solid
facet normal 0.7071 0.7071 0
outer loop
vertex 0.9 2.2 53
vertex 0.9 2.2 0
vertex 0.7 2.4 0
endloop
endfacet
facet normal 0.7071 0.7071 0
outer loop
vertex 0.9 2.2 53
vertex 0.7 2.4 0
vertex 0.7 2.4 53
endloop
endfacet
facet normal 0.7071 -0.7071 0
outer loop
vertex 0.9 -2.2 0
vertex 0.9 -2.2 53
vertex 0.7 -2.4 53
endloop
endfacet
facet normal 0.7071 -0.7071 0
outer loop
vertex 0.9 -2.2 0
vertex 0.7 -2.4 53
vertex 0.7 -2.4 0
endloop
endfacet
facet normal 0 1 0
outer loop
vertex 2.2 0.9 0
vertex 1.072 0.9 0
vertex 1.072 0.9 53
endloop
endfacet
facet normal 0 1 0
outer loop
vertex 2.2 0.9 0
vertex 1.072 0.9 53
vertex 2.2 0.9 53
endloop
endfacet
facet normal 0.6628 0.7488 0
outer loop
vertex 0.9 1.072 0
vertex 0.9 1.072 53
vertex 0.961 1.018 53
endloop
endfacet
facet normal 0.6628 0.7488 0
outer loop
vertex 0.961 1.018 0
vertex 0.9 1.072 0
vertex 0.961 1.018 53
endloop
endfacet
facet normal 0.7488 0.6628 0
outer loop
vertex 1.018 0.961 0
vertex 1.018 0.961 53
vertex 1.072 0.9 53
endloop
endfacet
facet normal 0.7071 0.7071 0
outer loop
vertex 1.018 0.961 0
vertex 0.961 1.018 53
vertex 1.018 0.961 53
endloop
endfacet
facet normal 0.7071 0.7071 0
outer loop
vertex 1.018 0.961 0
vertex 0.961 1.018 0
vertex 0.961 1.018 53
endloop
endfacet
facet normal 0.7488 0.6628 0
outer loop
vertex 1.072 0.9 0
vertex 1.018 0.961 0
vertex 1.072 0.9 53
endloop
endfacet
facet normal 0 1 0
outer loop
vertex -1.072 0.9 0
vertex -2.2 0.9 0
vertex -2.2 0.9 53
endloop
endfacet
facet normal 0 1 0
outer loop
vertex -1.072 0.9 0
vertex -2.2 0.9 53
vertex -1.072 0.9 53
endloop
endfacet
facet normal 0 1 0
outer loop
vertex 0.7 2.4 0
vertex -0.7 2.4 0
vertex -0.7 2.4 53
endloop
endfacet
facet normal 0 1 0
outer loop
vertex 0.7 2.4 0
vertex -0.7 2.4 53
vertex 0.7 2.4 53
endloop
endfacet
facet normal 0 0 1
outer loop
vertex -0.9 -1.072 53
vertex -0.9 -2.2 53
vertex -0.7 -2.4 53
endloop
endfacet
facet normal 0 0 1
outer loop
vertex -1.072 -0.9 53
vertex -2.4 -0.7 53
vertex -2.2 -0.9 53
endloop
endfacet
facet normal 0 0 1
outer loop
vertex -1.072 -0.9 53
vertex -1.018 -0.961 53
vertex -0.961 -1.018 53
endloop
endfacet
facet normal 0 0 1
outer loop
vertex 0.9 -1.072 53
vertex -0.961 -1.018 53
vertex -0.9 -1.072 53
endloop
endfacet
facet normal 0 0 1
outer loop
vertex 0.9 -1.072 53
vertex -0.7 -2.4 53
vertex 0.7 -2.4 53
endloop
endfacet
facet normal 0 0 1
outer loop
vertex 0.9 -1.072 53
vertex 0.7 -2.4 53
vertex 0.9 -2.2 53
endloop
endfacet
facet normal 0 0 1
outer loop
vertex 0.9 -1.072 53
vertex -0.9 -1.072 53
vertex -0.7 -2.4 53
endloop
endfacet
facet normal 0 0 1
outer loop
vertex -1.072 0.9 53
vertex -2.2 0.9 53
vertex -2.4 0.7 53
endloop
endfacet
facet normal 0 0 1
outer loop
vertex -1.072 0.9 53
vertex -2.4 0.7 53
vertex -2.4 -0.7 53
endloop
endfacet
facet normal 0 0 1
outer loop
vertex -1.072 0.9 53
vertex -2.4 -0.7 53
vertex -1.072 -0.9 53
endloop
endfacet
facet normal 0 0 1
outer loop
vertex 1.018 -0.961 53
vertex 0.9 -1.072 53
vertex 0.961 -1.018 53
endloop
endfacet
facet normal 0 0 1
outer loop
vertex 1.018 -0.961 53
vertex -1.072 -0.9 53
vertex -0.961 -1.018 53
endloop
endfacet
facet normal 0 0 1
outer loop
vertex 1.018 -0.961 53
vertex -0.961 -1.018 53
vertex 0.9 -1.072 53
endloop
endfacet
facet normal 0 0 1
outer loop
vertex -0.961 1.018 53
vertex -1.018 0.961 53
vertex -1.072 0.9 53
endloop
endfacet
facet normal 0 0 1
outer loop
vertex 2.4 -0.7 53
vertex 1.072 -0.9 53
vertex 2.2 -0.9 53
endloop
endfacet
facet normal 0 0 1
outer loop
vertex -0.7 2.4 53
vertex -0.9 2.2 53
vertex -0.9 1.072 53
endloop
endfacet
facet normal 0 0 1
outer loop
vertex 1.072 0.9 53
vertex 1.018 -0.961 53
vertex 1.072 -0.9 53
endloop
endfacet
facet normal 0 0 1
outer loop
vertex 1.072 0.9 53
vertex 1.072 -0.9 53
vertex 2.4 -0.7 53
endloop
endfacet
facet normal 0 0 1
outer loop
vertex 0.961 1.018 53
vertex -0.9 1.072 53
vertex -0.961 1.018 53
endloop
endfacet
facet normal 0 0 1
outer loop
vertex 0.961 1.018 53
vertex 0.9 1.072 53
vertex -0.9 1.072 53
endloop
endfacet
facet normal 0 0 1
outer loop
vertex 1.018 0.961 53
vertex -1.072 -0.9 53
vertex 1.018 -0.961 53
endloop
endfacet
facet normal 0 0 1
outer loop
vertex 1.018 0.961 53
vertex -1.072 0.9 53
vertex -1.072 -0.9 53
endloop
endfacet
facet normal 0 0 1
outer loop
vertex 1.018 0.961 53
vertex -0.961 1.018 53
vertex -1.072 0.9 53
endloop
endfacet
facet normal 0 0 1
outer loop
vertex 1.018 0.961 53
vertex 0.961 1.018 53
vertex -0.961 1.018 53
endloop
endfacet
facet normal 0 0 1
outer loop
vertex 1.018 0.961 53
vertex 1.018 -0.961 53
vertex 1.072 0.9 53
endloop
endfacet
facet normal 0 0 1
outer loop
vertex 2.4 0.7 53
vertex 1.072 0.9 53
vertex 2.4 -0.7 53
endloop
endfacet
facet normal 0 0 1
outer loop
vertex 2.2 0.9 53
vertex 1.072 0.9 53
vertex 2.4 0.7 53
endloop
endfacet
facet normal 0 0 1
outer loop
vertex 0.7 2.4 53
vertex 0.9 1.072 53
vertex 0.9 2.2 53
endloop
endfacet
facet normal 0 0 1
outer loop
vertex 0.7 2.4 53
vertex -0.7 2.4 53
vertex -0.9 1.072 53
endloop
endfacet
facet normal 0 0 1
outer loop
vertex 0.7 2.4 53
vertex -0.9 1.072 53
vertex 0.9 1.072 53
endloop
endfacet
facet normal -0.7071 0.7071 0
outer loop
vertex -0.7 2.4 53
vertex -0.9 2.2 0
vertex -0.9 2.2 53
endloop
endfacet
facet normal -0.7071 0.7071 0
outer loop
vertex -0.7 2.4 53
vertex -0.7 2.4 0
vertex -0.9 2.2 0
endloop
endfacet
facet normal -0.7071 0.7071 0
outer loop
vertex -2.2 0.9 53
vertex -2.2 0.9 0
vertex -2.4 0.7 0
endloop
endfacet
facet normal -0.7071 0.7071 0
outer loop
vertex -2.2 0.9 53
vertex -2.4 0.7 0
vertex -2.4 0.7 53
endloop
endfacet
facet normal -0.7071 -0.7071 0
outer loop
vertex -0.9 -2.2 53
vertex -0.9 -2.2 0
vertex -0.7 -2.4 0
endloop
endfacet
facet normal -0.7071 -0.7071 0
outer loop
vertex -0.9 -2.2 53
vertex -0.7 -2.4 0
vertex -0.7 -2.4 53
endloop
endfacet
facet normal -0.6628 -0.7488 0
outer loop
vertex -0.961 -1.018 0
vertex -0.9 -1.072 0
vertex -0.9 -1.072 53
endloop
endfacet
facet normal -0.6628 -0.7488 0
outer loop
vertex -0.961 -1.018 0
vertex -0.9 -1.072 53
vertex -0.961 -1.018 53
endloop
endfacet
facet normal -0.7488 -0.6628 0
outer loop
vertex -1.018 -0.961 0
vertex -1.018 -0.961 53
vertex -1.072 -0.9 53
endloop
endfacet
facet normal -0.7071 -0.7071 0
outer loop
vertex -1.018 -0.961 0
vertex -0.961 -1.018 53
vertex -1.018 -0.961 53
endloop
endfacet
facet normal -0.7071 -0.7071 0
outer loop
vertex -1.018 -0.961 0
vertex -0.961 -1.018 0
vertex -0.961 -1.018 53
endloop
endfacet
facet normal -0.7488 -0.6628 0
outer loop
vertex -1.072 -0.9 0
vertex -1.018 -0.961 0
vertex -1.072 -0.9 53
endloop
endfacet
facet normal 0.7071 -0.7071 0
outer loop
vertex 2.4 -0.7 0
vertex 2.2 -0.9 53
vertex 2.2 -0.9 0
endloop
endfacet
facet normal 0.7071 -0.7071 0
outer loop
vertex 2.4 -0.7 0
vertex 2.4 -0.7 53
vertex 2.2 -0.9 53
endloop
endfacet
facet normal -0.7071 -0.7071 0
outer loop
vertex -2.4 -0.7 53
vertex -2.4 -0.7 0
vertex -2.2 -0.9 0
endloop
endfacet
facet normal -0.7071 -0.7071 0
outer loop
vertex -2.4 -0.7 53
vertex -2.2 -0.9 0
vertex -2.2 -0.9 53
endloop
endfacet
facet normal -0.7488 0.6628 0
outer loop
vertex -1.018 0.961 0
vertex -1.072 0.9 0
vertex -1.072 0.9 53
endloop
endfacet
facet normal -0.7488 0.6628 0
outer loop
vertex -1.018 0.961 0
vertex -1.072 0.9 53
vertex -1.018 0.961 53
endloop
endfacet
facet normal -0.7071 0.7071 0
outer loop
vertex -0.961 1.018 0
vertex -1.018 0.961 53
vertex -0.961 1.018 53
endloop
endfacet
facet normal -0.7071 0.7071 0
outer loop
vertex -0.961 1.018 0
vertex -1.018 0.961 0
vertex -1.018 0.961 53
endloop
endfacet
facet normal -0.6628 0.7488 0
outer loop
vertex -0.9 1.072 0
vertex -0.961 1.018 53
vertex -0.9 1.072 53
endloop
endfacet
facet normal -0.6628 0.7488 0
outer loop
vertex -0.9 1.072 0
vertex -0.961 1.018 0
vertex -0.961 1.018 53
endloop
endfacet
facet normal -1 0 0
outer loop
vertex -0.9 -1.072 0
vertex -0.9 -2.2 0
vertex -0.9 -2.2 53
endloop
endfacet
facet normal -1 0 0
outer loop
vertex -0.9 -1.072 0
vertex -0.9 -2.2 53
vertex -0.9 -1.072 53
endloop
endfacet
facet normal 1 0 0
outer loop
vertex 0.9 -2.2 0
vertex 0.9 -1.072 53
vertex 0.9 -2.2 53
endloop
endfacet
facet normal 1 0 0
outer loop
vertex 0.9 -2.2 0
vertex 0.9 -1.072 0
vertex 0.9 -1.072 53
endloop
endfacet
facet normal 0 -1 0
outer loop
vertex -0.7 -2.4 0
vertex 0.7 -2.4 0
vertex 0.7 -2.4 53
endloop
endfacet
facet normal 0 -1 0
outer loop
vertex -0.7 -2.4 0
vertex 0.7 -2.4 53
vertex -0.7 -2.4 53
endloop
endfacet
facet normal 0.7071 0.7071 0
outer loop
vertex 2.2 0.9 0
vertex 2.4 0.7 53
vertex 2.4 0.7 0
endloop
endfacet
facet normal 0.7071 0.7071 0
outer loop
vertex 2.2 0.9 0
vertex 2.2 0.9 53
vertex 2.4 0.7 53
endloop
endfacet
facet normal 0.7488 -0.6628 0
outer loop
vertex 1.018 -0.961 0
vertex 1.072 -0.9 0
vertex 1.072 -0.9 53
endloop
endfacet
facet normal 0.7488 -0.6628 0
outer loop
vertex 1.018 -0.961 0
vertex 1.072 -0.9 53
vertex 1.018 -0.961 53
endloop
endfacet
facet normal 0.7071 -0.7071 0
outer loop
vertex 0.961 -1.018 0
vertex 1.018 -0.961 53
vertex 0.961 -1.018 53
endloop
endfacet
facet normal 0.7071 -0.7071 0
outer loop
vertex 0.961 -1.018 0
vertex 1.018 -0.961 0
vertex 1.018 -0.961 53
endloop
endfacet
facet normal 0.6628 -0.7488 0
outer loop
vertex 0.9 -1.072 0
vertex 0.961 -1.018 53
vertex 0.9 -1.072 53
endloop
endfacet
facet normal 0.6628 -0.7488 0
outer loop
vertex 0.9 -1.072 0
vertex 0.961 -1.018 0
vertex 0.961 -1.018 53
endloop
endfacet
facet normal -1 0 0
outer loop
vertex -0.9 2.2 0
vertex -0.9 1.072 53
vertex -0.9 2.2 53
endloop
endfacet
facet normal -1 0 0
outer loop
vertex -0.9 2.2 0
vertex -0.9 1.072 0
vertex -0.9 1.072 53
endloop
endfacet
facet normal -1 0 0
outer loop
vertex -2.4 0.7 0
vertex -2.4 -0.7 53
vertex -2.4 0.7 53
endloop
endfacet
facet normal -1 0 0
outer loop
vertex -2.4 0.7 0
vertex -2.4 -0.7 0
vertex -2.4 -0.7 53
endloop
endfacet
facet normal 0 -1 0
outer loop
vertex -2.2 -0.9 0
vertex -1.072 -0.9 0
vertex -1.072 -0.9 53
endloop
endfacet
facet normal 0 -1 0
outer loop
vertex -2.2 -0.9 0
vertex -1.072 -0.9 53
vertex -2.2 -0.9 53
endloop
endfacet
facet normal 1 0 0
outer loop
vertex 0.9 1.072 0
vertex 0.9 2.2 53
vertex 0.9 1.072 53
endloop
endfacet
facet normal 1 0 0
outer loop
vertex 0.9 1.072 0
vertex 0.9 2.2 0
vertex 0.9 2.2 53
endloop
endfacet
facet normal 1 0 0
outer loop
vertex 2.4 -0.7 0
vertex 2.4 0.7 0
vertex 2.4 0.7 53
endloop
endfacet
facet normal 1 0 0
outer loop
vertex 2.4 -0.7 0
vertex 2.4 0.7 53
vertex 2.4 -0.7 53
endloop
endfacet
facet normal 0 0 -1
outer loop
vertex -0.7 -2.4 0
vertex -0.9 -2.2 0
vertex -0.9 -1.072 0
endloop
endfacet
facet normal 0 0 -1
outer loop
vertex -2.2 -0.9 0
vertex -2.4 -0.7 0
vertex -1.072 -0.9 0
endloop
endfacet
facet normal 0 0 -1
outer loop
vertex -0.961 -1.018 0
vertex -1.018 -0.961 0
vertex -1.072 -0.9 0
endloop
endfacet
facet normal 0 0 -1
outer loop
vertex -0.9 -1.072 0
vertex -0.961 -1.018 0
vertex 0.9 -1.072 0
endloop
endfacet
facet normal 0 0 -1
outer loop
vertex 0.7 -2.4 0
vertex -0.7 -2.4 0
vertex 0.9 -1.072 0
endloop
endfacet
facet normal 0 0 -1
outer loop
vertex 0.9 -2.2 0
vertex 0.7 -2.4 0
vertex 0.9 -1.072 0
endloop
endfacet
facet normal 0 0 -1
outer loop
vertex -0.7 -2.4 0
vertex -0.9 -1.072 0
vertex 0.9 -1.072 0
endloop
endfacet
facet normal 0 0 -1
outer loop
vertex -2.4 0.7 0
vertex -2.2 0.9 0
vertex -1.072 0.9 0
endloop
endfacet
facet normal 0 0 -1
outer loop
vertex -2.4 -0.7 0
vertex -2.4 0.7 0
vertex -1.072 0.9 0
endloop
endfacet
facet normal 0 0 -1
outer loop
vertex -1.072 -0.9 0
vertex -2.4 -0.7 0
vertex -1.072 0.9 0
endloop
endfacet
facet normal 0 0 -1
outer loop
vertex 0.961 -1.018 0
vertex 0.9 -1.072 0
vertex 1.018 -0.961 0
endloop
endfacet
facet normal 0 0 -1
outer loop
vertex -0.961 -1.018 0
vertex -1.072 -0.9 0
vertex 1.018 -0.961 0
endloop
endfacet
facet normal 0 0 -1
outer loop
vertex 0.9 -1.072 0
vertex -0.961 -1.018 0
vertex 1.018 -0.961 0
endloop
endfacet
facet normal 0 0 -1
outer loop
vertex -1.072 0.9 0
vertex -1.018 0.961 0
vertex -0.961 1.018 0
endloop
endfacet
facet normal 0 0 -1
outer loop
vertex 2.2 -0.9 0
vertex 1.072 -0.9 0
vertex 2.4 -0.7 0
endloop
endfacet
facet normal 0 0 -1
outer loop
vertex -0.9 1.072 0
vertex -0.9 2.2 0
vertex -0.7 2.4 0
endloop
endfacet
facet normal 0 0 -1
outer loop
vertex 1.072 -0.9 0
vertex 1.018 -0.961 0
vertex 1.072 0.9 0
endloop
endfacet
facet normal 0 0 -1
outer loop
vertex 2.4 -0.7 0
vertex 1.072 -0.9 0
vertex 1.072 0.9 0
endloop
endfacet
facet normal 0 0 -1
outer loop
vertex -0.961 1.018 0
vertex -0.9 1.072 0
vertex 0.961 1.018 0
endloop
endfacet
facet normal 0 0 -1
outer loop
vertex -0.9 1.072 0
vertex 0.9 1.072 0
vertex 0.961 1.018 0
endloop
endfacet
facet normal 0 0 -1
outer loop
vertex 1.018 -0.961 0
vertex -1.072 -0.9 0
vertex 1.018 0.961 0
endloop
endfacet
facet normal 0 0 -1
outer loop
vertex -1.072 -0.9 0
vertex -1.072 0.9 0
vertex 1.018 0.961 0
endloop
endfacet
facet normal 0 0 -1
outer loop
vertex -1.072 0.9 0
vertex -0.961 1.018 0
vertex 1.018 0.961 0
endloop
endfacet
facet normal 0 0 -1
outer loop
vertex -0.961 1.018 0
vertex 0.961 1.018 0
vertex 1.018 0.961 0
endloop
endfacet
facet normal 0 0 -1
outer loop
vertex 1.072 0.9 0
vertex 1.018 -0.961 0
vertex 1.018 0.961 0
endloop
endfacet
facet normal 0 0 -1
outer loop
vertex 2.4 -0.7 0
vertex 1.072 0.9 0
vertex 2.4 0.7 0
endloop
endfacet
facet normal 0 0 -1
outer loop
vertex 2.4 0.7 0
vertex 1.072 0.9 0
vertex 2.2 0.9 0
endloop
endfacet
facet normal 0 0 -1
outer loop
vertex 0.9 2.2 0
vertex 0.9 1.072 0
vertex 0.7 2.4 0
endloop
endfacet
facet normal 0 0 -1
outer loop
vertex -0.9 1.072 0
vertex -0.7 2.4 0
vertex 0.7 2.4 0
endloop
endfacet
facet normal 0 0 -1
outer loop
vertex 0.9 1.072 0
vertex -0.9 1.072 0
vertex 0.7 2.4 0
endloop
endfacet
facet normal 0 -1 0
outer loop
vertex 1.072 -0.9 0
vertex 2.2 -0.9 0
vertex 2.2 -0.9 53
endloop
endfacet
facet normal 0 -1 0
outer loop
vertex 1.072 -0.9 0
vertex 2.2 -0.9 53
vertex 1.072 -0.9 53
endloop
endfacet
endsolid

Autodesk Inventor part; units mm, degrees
ref_plane "YZ Plane" through (0, 0, 0) normal (1, 0, 0) x (0, 1, 0)
ref_plane "XZ Plane" through (0, 0, 0) normal (0, 1, 0) x (-1, 0, 0)
ref_plane "XY Plane" through (0, 0, 0) normal (0, 0, 1) x (1, 0, 0)
sketch "Boceto1" plane through (0, 0, 0) normal (0, 0, 1) x (1, 0, 0)
  line L0 (0.9, -2.4) -> (-0.9, -2.4)
  line L1 (-0.9, -2.4) -> (-0.9, 2.4)
  line L2 (-0.9, 2.4) -> (0.9, 2.4)
  line L3 (0.9, 2.4) -> (0.9, -2.4)
  line L4 (0.9, -2.4) -> (-0.9, 2.4) construction
  line L5 (-0.9, -2.4) -> (0.9, 2.4) construction
  line L6 (2.4, -0.9) -> (-2.4, -0.9)
  line L7 (-2.4, -0.9) -> (-2.4, 0.9)
  line L8 (-2.4, 0.9) -> (2.4, 0.9)
  line L9 (2.4, 0.9) -> (2.4, -0.9)
  line L10 (2.4, -0.9) -> (-2.4, 0.9) construction
  line L11 (-2.4, -0.9) -> (2.4, 0.9) construction
  circle A0 centre (0, 0) radius 1.4
  point P0 (1.0724, 0.9)
  point P1 (0.9, 1.0724)
  point P2 (-0.9, 1.0724)
  point P3 (-1.0724, 0.9)
  point P4 (-1.0724, -0.9)
  point P5 (-0.9, -1.0724)
  point P6 (0.9, -1.0724)
  point P7 (1.0724, -0.9)
  dimension "d0" = 1.8
  dimension "d1" = 4.8
  dimension "d2" = 2.8
extrude "Extrusión1" add sketch "Boceto1" along normal blind 53
chamfer "Chaflán1" distance 0.2 angle 45 8 edges at (0.9, 2.4, 26.5) (2.4, 0.9, 26.5) (2.4, -0.9, 26.5) (0.9, -2.4, 26.5) (-0.9, 2.4, 26.5) (-2.4, 0.9, 26.5) (-2.4, -0.9, 26.5) (-0.9, -2.4, 26.5)
properties part number "EjeMotor"
